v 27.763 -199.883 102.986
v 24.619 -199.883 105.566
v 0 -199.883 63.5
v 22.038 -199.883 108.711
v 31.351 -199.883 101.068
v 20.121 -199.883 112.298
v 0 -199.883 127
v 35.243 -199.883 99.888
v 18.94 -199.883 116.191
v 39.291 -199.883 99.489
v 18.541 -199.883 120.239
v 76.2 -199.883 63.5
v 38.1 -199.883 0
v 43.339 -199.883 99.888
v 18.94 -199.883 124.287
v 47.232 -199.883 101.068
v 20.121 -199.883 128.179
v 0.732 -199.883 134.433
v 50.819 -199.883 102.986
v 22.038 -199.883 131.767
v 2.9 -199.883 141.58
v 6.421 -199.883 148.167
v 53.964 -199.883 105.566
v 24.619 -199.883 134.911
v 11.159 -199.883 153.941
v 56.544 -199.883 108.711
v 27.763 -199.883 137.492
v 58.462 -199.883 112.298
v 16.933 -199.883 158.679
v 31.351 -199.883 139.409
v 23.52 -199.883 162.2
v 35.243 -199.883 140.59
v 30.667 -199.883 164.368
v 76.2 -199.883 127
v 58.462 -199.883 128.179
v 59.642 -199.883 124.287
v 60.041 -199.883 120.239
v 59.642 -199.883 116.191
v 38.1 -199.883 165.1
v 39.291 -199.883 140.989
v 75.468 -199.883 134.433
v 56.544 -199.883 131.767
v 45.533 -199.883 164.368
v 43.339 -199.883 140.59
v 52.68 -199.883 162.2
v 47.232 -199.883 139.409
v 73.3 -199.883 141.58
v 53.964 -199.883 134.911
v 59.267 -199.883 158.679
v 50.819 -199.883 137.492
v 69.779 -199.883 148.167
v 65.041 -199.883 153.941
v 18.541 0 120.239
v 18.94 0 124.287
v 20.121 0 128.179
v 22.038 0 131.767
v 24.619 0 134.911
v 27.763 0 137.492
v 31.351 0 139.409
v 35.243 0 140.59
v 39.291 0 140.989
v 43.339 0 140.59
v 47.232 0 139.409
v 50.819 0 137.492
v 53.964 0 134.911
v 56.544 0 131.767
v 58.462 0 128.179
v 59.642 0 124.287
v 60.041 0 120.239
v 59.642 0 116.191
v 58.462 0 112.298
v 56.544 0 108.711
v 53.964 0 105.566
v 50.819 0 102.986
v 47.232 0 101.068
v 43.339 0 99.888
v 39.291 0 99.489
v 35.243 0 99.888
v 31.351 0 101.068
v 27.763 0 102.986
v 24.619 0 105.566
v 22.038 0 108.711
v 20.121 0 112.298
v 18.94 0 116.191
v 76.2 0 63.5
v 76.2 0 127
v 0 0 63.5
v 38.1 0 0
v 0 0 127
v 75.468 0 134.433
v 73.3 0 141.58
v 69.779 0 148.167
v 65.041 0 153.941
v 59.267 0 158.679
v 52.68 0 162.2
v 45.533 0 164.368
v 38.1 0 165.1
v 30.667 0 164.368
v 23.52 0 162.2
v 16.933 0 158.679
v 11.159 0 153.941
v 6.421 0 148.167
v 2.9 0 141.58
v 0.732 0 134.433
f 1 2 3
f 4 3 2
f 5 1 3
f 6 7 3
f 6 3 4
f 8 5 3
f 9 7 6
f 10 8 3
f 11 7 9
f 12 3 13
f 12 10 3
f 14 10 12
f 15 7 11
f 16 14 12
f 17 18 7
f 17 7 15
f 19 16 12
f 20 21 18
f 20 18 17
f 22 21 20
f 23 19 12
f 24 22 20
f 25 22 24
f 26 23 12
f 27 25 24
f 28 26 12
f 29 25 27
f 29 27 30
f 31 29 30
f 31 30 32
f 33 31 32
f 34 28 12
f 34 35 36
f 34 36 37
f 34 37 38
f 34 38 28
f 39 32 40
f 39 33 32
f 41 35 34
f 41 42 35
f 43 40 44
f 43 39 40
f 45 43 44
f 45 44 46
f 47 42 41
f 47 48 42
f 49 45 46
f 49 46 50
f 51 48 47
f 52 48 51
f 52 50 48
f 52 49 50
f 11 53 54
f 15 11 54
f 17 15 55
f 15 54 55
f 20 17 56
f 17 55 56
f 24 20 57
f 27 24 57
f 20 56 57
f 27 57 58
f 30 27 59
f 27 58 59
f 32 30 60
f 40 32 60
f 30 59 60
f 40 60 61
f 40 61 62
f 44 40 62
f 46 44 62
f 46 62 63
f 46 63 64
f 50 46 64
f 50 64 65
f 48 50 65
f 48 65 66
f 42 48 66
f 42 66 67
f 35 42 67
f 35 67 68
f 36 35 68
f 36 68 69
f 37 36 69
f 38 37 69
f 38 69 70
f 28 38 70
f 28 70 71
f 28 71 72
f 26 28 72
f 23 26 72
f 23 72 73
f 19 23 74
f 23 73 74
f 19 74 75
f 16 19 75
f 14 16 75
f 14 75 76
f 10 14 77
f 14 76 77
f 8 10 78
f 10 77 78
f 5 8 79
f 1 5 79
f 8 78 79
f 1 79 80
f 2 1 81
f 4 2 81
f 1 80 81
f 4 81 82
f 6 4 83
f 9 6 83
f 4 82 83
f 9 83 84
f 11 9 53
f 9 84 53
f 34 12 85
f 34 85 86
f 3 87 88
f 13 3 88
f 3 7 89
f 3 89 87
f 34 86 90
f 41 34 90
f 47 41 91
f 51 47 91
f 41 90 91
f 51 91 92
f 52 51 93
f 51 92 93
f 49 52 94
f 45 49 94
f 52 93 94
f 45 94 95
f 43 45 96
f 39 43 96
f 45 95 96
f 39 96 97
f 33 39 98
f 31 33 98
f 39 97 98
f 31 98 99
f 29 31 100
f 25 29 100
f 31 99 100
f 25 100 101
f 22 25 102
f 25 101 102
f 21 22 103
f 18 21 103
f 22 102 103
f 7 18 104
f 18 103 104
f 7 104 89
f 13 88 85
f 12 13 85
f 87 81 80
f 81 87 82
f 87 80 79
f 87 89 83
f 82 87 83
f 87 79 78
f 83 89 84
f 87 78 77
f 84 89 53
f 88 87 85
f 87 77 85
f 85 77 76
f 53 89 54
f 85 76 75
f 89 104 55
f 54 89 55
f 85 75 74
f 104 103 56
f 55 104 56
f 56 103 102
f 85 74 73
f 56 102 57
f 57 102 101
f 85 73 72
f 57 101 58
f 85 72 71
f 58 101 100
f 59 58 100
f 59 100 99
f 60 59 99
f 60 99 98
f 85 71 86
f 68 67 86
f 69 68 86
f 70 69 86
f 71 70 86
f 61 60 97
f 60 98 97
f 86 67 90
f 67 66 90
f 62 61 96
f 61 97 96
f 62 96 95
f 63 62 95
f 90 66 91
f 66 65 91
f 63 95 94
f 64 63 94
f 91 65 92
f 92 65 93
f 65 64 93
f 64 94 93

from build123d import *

# Parameters (mm, degrees)
F1_DEPTH = 199.88325
F2_R     = 20.749815
F3_DEPTH = 239.77543


with BuildPart() as f1:
    # F0 (on Front) → F1 (new body)
    with BuildSketch(Plane.XZ):
        with BuildLine():
            Line((0, 63.5), (38.1, 0))
            Line((38.1, 0), (76.2, 63.5))
            Line((76.2, 63.5), (76.2, 127))
            ThreePointArc((76.2, 127), (38.1, 88.9), (0, 127))
            Line((0, 127), (0, 63.5))
        make_face()
        with BuildLine():
            Line((76.2, 127), (0, 127))
            ThreePointArc((0, 127), (38.1, 88.9), (76.2, 127))
        make_face()
        with BuildLine():
            ThreePointArc((76.2, 127), (38.1, 165.1), (0, 127))
            Line((0, 127), (76.2, 127))
        make_face()
    extrude(amount=F1_DEPTH)

    # F2 (on face) → F3 (cut)
    with BuildSketch(Plane(origin=(0, 0, 0), x_dir=(-1, 0, 0), z_dir=(0, 1, 0))):
        with Locations((-39.291214, 120.238699)):
            Circle(F2_R)
    extrude(amount=-F3_DEPTH, mode=Mode.SUBTRACT)


solid = f1.part
